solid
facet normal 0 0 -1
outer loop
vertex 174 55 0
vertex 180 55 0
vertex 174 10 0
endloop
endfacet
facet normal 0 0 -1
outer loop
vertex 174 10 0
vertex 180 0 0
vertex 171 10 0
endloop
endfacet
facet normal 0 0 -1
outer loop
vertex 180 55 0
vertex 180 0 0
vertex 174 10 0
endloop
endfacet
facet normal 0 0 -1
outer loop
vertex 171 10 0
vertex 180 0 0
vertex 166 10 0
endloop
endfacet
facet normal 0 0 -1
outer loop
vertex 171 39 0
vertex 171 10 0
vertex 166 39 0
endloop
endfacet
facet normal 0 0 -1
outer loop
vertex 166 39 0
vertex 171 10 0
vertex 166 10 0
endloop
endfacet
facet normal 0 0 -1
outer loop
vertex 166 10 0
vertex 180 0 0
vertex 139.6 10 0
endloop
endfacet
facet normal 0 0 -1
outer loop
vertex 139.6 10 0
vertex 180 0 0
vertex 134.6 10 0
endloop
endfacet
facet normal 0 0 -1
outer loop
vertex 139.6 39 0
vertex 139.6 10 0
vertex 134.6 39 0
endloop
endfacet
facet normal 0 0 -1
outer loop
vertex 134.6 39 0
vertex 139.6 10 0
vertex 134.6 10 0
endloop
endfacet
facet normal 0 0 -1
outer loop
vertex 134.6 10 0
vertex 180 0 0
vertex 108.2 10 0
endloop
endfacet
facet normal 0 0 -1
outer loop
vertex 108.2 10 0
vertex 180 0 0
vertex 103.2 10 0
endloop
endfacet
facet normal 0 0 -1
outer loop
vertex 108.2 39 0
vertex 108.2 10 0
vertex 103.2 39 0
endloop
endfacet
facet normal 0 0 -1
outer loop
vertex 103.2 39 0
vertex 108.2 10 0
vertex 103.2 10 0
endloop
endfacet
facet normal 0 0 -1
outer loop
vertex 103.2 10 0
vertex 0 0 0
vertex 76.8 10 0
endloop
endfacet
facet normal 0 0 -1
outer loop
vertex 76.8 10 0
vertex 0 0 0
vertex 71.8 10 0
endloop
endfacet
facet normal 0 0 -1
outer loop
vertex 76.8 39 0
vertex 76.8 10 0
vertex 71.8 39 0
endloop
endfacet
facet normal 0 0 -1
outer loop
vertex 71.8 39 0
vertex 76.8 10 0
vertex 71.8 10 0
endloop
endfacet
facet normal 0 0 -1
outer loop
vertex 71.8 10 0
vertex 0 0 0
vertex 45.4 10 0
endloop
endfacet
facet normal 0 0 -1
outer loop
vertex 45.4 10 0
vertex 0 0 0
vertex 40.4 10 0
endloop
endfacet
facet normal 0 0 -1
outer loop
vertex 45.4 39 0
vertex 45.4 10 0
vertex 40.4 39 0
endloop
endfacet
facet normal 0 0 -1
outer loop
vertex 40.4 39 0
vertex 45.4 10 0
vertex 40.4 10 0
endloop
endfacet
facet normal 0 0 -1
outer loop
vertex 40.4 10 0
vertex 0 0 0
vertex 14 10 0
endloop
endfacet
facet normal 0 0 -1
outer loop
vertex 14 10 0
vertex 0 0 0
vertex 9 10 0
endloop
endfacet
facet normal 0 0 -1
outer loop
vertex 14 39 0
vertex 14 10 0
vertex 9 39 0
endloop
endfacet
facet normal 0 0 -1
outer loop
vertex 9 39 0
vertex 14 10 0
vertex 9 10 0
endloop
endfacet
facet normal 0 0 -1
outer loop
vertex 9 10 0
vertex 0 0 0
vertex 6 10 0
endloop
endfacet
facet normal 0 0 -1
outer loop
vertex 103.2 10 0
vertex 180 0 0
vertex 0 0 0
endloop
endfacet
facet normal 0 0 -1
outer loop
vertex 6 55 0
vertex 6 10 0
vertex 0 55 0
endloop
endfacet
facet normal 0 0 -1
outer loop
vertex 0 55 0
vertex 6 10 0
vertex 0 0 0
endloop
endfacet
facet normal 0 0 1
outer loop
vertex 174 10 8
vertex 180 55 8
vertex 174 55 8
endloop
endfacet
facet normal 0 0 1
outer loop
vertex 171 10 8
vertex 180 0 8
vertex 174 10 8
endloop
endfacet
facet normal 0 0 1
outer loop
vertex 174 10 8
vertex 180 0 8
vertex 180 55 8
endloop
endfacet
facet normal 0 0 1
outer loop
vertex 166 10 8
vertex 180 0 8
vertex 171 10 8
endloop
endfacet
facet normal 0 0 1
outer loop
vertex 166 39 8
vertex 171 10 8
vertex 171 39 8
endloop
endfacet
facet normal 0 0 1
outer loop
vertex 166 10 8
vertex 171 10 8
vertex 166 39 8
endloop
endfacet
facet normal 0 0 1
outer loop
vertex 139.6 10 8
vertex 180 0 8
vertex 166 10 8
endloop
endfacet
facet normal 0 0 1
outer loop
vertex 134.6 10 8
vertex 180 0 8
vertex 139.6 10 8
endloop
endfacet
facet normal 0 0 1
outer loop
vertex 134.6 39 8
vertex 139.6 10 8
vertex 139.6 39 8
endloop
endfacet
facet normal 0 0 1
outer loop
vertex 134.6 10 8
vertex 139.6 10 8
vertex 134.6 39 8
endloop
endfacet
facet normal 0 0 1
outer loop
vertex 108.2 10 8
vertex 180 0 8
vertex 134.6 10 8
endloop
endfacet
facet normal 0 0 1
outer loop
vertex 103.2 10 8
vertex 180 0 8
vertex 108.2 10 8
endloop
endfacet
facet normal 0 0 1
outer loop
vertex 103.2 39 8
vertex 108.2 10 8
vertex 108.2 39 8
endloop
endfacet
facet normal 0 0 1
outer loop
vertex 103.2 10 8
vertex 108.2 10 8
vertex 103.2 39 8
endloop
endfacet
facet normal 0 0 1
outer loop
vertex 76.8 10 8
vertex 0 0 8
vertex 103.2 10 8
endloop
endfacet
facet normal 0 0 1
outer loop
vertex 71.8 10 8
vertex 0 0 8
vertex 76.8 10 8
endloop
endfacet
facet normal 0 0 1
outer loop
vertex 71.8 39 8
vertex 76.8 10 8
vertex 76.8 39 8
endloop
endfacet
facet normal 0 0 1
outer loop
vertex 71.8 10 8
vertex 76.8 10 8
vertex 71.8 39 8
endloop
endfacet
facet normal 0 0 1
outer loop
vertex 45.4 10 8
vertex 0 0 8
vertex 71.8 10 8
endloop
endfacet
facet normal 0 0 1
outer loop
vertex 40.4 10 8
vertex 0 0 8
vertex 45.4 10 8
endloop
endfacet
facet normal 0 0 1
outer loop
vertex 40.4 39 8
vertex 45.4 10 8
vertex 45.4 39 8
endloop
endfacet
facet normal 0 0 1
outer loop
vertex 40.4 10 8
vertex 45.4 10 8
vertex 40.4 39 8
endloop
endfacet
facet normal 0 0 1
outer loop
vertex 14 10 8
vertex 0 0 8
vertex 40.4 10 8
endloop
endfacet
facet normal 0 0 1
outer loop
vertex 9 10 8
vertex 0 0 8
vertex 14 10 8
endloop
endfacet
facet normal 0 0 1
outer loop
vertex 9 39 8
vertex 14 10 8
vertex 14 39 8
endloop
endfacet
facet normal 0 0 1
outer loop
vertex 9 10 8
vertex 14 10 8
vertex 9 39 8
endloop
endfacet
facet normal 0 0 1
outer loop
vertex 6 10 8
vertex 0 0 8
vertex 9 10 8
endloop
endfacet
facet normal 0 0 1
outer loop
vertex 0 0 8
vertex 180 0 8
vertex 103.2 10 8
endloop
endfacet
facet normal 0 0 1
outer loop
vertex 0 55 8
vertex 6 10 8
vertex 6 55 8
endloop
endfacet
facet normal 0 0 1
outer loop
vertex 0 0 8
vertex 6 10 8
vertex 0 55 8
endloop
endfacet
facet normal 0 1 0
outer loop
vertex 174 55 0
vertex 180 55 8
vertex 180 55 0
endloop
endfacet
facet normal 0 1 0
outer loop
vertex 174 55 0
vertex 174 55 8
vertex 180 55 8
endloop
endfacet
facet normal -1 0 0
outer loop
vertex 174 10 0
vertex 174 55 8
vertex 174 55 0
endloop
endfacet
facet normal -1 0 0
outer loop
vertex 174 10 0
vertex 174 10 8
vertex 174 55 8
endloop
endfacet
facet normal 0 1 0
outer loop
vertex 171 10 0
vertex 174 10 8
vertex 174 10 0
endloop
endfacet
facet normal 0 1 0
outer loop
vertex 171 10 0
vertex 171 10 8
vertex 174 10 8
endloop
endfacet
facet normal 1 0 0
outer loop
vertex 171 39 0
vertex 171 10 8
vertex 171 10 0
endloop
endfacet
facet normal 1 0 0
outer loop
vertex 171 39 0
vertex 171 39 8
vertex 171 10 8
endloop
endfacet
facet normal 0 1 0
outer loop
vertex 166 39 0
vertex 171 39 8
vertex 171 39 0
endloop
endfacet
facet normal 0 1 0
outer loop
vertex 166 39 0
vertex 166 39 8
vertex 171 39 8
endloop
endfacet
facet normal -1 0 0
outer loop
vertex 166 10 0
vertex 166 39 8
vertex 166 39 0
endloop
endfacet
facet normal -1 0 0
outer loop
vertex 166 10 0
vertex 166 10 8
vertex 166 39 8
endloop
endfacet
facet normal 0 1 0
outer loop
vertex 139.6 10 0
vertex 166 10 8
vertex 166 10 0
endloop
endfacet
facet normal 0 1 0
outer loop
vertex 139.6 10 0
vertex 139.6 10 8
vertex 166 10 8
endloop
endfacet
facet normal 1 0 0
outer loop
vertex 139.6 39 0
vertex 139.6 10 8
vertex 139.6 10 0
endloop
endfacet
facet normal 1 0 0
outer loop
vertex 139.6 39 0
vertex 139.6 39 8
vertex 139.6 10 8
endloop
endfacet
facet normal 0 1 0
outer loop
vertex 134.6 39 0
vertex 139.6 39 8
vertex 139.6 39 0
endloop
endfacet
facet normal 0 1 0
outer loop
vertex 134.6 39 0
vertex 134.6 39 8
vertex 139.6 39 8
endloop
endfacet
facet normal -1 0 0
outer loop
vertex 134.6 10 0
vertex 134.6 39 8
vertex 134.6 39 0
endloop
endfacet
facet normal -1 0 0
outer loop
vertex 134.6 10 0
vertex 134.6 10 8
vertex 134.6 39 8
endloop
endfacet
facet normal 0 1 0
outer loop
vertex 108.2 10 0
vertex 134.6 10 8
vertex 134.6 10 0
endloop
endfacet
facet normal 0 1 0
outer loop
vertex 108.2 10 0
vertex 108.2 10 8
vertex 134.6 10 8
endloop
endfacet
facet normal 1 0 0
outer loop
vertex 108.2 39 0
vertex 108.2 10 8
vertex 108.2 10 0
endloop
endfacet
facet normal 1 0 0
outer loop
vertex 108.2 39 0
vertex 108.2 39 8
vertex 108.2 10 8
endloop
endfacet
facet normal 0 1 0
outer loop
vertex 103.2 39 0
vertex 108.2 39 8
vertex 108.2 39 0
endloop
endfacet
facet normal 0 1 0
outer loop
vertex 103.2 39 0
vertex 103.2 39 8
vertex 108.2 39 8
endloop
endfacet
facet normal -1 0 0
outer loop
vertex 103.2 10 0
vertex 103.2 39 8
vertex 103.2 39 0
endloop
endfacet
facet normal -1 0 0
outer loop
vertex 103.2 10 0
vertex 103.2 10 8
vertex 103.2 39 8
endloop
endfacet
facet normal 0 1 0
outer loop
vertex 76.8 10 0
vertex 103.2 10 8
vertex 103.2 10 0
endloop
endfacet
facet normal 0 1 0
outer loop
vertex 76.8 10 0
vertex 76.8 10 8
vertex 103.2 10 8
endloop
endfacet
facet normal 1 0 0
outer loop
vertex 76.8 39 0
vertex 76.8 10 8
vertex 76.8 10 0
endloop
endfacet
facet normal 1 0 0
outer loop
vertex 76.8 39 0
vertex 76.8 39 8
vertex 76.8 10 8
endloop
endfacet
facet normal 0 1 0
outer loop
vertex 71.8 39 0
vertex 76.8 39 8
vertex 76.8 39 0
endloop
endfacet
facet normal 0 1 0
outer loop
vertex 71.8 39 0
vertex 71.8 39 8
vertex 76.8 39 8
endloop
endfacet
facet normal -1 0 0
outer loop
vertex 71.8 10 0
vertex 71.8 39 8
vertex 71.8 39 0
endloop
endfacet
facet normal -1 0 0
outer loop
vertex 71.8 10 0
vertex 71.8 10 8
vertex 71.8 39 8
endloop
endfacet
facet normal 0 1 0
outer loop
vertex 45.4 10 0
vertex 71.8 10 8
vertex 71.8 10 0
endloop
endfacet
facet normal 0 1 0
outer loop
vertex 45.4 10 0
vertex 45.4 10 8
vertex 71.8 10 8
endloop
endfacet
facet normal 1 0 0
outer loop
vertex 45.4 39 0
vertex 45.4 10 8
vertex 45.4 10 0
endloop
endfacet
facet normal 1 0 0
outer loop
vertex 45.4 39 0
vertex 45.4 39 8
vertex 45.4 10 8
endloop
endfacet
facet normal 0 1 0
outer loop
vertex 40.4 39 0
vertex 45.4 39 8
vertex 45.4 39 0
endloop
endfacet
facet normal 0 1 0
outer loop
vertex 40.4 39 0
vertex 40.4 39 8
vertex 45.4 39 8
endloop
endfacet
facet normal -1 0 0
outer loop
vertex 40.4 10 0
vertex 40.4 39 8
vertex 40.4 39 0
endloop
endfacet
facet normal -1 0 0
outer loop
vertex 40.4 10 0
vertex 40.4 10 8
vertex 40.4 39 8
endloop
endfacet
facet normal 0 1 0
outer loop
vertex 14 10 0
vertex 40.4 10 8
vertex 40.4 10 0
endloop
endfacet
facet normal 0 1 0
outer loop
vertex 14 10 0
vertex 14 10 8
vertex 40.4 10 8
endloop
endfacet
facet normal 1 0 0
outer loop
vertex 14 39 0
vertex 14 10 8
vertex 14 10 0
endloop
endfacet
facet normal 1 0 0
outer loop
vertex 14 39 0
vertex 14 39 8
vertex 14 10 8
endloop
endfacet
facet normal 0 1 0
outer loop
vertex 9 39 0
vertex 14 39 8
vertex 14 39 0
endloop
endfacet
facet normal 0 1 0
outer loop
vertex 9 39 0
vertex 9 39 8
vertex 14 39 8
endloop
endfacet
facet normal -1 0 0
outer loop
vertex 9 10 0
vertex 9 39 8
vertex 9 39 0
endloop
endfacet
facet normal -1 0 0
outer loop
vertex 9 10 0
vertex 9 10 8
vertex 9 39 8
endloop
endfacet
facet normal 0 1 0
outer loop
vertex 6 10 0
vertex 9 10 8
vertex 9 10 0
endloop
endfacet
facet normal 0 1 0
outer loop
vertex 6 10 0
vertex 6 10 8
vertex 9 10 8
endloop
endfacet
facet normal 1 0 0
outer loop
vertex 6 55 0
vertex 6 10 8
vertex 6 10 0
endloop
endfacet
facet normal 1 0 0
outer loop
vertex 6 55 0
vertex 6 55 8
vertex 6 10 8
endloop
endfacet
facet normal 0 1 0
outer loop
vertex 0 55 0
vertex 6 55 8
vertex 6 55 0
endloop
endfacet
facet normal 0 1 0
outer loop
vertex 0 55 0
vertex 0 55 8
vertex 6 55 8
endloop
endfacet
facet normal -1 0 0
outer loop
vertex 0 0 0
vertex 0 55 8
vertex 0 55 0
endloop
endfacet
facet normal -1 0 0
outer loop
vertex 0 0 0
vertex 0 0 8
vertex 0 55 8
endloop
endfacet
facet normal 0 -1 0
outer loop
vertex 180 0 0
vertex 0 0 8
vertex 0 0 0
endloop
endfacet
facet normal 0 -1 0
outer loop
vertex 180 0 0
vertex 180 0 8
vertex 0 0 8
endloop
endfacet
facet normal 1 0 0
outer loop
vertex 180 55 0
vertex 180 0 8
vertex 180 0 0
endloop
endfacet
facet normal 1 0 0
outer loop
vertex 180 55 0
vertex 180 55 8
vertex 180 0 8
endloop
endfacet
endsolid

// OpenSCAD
$fn = 32;

// ----------------------------------------------------------------------
// Guard grille: 6 slats over a 180 x 55 mm plate
// ----------------------------------------------------------------------

// --- parameters (mm) ---
profile_height = 8;       // extrusion height
profile_points = 32;      // points of the closed outline

profile = [[0, 0], [180, 0], [180, 55], [174, 55], [174, 10], [171, 10], [171, 39], [166, 39], [166, 10], [139.6, 10], [139.6, 39], [134.6, 39], [134.6, 10], [108.2, 10], [108.2, 39], [103.2, 39], [103.2, 10], [76.8, 10], [76.8, 39], [71.8, 39], [71.8, 10], [45.4, 10], [45.4, 39], [40.4, 39], [40.4, 10], [14, 10], [14, 39], [9, 39], [9, 10], [6, 10], [6, 55], [0, 55]];  // single closed polygon, 32 points, counter clockwise

// --- the one profile operation ---
linear_extrude(height = profile_height) polygon(points = profile);
